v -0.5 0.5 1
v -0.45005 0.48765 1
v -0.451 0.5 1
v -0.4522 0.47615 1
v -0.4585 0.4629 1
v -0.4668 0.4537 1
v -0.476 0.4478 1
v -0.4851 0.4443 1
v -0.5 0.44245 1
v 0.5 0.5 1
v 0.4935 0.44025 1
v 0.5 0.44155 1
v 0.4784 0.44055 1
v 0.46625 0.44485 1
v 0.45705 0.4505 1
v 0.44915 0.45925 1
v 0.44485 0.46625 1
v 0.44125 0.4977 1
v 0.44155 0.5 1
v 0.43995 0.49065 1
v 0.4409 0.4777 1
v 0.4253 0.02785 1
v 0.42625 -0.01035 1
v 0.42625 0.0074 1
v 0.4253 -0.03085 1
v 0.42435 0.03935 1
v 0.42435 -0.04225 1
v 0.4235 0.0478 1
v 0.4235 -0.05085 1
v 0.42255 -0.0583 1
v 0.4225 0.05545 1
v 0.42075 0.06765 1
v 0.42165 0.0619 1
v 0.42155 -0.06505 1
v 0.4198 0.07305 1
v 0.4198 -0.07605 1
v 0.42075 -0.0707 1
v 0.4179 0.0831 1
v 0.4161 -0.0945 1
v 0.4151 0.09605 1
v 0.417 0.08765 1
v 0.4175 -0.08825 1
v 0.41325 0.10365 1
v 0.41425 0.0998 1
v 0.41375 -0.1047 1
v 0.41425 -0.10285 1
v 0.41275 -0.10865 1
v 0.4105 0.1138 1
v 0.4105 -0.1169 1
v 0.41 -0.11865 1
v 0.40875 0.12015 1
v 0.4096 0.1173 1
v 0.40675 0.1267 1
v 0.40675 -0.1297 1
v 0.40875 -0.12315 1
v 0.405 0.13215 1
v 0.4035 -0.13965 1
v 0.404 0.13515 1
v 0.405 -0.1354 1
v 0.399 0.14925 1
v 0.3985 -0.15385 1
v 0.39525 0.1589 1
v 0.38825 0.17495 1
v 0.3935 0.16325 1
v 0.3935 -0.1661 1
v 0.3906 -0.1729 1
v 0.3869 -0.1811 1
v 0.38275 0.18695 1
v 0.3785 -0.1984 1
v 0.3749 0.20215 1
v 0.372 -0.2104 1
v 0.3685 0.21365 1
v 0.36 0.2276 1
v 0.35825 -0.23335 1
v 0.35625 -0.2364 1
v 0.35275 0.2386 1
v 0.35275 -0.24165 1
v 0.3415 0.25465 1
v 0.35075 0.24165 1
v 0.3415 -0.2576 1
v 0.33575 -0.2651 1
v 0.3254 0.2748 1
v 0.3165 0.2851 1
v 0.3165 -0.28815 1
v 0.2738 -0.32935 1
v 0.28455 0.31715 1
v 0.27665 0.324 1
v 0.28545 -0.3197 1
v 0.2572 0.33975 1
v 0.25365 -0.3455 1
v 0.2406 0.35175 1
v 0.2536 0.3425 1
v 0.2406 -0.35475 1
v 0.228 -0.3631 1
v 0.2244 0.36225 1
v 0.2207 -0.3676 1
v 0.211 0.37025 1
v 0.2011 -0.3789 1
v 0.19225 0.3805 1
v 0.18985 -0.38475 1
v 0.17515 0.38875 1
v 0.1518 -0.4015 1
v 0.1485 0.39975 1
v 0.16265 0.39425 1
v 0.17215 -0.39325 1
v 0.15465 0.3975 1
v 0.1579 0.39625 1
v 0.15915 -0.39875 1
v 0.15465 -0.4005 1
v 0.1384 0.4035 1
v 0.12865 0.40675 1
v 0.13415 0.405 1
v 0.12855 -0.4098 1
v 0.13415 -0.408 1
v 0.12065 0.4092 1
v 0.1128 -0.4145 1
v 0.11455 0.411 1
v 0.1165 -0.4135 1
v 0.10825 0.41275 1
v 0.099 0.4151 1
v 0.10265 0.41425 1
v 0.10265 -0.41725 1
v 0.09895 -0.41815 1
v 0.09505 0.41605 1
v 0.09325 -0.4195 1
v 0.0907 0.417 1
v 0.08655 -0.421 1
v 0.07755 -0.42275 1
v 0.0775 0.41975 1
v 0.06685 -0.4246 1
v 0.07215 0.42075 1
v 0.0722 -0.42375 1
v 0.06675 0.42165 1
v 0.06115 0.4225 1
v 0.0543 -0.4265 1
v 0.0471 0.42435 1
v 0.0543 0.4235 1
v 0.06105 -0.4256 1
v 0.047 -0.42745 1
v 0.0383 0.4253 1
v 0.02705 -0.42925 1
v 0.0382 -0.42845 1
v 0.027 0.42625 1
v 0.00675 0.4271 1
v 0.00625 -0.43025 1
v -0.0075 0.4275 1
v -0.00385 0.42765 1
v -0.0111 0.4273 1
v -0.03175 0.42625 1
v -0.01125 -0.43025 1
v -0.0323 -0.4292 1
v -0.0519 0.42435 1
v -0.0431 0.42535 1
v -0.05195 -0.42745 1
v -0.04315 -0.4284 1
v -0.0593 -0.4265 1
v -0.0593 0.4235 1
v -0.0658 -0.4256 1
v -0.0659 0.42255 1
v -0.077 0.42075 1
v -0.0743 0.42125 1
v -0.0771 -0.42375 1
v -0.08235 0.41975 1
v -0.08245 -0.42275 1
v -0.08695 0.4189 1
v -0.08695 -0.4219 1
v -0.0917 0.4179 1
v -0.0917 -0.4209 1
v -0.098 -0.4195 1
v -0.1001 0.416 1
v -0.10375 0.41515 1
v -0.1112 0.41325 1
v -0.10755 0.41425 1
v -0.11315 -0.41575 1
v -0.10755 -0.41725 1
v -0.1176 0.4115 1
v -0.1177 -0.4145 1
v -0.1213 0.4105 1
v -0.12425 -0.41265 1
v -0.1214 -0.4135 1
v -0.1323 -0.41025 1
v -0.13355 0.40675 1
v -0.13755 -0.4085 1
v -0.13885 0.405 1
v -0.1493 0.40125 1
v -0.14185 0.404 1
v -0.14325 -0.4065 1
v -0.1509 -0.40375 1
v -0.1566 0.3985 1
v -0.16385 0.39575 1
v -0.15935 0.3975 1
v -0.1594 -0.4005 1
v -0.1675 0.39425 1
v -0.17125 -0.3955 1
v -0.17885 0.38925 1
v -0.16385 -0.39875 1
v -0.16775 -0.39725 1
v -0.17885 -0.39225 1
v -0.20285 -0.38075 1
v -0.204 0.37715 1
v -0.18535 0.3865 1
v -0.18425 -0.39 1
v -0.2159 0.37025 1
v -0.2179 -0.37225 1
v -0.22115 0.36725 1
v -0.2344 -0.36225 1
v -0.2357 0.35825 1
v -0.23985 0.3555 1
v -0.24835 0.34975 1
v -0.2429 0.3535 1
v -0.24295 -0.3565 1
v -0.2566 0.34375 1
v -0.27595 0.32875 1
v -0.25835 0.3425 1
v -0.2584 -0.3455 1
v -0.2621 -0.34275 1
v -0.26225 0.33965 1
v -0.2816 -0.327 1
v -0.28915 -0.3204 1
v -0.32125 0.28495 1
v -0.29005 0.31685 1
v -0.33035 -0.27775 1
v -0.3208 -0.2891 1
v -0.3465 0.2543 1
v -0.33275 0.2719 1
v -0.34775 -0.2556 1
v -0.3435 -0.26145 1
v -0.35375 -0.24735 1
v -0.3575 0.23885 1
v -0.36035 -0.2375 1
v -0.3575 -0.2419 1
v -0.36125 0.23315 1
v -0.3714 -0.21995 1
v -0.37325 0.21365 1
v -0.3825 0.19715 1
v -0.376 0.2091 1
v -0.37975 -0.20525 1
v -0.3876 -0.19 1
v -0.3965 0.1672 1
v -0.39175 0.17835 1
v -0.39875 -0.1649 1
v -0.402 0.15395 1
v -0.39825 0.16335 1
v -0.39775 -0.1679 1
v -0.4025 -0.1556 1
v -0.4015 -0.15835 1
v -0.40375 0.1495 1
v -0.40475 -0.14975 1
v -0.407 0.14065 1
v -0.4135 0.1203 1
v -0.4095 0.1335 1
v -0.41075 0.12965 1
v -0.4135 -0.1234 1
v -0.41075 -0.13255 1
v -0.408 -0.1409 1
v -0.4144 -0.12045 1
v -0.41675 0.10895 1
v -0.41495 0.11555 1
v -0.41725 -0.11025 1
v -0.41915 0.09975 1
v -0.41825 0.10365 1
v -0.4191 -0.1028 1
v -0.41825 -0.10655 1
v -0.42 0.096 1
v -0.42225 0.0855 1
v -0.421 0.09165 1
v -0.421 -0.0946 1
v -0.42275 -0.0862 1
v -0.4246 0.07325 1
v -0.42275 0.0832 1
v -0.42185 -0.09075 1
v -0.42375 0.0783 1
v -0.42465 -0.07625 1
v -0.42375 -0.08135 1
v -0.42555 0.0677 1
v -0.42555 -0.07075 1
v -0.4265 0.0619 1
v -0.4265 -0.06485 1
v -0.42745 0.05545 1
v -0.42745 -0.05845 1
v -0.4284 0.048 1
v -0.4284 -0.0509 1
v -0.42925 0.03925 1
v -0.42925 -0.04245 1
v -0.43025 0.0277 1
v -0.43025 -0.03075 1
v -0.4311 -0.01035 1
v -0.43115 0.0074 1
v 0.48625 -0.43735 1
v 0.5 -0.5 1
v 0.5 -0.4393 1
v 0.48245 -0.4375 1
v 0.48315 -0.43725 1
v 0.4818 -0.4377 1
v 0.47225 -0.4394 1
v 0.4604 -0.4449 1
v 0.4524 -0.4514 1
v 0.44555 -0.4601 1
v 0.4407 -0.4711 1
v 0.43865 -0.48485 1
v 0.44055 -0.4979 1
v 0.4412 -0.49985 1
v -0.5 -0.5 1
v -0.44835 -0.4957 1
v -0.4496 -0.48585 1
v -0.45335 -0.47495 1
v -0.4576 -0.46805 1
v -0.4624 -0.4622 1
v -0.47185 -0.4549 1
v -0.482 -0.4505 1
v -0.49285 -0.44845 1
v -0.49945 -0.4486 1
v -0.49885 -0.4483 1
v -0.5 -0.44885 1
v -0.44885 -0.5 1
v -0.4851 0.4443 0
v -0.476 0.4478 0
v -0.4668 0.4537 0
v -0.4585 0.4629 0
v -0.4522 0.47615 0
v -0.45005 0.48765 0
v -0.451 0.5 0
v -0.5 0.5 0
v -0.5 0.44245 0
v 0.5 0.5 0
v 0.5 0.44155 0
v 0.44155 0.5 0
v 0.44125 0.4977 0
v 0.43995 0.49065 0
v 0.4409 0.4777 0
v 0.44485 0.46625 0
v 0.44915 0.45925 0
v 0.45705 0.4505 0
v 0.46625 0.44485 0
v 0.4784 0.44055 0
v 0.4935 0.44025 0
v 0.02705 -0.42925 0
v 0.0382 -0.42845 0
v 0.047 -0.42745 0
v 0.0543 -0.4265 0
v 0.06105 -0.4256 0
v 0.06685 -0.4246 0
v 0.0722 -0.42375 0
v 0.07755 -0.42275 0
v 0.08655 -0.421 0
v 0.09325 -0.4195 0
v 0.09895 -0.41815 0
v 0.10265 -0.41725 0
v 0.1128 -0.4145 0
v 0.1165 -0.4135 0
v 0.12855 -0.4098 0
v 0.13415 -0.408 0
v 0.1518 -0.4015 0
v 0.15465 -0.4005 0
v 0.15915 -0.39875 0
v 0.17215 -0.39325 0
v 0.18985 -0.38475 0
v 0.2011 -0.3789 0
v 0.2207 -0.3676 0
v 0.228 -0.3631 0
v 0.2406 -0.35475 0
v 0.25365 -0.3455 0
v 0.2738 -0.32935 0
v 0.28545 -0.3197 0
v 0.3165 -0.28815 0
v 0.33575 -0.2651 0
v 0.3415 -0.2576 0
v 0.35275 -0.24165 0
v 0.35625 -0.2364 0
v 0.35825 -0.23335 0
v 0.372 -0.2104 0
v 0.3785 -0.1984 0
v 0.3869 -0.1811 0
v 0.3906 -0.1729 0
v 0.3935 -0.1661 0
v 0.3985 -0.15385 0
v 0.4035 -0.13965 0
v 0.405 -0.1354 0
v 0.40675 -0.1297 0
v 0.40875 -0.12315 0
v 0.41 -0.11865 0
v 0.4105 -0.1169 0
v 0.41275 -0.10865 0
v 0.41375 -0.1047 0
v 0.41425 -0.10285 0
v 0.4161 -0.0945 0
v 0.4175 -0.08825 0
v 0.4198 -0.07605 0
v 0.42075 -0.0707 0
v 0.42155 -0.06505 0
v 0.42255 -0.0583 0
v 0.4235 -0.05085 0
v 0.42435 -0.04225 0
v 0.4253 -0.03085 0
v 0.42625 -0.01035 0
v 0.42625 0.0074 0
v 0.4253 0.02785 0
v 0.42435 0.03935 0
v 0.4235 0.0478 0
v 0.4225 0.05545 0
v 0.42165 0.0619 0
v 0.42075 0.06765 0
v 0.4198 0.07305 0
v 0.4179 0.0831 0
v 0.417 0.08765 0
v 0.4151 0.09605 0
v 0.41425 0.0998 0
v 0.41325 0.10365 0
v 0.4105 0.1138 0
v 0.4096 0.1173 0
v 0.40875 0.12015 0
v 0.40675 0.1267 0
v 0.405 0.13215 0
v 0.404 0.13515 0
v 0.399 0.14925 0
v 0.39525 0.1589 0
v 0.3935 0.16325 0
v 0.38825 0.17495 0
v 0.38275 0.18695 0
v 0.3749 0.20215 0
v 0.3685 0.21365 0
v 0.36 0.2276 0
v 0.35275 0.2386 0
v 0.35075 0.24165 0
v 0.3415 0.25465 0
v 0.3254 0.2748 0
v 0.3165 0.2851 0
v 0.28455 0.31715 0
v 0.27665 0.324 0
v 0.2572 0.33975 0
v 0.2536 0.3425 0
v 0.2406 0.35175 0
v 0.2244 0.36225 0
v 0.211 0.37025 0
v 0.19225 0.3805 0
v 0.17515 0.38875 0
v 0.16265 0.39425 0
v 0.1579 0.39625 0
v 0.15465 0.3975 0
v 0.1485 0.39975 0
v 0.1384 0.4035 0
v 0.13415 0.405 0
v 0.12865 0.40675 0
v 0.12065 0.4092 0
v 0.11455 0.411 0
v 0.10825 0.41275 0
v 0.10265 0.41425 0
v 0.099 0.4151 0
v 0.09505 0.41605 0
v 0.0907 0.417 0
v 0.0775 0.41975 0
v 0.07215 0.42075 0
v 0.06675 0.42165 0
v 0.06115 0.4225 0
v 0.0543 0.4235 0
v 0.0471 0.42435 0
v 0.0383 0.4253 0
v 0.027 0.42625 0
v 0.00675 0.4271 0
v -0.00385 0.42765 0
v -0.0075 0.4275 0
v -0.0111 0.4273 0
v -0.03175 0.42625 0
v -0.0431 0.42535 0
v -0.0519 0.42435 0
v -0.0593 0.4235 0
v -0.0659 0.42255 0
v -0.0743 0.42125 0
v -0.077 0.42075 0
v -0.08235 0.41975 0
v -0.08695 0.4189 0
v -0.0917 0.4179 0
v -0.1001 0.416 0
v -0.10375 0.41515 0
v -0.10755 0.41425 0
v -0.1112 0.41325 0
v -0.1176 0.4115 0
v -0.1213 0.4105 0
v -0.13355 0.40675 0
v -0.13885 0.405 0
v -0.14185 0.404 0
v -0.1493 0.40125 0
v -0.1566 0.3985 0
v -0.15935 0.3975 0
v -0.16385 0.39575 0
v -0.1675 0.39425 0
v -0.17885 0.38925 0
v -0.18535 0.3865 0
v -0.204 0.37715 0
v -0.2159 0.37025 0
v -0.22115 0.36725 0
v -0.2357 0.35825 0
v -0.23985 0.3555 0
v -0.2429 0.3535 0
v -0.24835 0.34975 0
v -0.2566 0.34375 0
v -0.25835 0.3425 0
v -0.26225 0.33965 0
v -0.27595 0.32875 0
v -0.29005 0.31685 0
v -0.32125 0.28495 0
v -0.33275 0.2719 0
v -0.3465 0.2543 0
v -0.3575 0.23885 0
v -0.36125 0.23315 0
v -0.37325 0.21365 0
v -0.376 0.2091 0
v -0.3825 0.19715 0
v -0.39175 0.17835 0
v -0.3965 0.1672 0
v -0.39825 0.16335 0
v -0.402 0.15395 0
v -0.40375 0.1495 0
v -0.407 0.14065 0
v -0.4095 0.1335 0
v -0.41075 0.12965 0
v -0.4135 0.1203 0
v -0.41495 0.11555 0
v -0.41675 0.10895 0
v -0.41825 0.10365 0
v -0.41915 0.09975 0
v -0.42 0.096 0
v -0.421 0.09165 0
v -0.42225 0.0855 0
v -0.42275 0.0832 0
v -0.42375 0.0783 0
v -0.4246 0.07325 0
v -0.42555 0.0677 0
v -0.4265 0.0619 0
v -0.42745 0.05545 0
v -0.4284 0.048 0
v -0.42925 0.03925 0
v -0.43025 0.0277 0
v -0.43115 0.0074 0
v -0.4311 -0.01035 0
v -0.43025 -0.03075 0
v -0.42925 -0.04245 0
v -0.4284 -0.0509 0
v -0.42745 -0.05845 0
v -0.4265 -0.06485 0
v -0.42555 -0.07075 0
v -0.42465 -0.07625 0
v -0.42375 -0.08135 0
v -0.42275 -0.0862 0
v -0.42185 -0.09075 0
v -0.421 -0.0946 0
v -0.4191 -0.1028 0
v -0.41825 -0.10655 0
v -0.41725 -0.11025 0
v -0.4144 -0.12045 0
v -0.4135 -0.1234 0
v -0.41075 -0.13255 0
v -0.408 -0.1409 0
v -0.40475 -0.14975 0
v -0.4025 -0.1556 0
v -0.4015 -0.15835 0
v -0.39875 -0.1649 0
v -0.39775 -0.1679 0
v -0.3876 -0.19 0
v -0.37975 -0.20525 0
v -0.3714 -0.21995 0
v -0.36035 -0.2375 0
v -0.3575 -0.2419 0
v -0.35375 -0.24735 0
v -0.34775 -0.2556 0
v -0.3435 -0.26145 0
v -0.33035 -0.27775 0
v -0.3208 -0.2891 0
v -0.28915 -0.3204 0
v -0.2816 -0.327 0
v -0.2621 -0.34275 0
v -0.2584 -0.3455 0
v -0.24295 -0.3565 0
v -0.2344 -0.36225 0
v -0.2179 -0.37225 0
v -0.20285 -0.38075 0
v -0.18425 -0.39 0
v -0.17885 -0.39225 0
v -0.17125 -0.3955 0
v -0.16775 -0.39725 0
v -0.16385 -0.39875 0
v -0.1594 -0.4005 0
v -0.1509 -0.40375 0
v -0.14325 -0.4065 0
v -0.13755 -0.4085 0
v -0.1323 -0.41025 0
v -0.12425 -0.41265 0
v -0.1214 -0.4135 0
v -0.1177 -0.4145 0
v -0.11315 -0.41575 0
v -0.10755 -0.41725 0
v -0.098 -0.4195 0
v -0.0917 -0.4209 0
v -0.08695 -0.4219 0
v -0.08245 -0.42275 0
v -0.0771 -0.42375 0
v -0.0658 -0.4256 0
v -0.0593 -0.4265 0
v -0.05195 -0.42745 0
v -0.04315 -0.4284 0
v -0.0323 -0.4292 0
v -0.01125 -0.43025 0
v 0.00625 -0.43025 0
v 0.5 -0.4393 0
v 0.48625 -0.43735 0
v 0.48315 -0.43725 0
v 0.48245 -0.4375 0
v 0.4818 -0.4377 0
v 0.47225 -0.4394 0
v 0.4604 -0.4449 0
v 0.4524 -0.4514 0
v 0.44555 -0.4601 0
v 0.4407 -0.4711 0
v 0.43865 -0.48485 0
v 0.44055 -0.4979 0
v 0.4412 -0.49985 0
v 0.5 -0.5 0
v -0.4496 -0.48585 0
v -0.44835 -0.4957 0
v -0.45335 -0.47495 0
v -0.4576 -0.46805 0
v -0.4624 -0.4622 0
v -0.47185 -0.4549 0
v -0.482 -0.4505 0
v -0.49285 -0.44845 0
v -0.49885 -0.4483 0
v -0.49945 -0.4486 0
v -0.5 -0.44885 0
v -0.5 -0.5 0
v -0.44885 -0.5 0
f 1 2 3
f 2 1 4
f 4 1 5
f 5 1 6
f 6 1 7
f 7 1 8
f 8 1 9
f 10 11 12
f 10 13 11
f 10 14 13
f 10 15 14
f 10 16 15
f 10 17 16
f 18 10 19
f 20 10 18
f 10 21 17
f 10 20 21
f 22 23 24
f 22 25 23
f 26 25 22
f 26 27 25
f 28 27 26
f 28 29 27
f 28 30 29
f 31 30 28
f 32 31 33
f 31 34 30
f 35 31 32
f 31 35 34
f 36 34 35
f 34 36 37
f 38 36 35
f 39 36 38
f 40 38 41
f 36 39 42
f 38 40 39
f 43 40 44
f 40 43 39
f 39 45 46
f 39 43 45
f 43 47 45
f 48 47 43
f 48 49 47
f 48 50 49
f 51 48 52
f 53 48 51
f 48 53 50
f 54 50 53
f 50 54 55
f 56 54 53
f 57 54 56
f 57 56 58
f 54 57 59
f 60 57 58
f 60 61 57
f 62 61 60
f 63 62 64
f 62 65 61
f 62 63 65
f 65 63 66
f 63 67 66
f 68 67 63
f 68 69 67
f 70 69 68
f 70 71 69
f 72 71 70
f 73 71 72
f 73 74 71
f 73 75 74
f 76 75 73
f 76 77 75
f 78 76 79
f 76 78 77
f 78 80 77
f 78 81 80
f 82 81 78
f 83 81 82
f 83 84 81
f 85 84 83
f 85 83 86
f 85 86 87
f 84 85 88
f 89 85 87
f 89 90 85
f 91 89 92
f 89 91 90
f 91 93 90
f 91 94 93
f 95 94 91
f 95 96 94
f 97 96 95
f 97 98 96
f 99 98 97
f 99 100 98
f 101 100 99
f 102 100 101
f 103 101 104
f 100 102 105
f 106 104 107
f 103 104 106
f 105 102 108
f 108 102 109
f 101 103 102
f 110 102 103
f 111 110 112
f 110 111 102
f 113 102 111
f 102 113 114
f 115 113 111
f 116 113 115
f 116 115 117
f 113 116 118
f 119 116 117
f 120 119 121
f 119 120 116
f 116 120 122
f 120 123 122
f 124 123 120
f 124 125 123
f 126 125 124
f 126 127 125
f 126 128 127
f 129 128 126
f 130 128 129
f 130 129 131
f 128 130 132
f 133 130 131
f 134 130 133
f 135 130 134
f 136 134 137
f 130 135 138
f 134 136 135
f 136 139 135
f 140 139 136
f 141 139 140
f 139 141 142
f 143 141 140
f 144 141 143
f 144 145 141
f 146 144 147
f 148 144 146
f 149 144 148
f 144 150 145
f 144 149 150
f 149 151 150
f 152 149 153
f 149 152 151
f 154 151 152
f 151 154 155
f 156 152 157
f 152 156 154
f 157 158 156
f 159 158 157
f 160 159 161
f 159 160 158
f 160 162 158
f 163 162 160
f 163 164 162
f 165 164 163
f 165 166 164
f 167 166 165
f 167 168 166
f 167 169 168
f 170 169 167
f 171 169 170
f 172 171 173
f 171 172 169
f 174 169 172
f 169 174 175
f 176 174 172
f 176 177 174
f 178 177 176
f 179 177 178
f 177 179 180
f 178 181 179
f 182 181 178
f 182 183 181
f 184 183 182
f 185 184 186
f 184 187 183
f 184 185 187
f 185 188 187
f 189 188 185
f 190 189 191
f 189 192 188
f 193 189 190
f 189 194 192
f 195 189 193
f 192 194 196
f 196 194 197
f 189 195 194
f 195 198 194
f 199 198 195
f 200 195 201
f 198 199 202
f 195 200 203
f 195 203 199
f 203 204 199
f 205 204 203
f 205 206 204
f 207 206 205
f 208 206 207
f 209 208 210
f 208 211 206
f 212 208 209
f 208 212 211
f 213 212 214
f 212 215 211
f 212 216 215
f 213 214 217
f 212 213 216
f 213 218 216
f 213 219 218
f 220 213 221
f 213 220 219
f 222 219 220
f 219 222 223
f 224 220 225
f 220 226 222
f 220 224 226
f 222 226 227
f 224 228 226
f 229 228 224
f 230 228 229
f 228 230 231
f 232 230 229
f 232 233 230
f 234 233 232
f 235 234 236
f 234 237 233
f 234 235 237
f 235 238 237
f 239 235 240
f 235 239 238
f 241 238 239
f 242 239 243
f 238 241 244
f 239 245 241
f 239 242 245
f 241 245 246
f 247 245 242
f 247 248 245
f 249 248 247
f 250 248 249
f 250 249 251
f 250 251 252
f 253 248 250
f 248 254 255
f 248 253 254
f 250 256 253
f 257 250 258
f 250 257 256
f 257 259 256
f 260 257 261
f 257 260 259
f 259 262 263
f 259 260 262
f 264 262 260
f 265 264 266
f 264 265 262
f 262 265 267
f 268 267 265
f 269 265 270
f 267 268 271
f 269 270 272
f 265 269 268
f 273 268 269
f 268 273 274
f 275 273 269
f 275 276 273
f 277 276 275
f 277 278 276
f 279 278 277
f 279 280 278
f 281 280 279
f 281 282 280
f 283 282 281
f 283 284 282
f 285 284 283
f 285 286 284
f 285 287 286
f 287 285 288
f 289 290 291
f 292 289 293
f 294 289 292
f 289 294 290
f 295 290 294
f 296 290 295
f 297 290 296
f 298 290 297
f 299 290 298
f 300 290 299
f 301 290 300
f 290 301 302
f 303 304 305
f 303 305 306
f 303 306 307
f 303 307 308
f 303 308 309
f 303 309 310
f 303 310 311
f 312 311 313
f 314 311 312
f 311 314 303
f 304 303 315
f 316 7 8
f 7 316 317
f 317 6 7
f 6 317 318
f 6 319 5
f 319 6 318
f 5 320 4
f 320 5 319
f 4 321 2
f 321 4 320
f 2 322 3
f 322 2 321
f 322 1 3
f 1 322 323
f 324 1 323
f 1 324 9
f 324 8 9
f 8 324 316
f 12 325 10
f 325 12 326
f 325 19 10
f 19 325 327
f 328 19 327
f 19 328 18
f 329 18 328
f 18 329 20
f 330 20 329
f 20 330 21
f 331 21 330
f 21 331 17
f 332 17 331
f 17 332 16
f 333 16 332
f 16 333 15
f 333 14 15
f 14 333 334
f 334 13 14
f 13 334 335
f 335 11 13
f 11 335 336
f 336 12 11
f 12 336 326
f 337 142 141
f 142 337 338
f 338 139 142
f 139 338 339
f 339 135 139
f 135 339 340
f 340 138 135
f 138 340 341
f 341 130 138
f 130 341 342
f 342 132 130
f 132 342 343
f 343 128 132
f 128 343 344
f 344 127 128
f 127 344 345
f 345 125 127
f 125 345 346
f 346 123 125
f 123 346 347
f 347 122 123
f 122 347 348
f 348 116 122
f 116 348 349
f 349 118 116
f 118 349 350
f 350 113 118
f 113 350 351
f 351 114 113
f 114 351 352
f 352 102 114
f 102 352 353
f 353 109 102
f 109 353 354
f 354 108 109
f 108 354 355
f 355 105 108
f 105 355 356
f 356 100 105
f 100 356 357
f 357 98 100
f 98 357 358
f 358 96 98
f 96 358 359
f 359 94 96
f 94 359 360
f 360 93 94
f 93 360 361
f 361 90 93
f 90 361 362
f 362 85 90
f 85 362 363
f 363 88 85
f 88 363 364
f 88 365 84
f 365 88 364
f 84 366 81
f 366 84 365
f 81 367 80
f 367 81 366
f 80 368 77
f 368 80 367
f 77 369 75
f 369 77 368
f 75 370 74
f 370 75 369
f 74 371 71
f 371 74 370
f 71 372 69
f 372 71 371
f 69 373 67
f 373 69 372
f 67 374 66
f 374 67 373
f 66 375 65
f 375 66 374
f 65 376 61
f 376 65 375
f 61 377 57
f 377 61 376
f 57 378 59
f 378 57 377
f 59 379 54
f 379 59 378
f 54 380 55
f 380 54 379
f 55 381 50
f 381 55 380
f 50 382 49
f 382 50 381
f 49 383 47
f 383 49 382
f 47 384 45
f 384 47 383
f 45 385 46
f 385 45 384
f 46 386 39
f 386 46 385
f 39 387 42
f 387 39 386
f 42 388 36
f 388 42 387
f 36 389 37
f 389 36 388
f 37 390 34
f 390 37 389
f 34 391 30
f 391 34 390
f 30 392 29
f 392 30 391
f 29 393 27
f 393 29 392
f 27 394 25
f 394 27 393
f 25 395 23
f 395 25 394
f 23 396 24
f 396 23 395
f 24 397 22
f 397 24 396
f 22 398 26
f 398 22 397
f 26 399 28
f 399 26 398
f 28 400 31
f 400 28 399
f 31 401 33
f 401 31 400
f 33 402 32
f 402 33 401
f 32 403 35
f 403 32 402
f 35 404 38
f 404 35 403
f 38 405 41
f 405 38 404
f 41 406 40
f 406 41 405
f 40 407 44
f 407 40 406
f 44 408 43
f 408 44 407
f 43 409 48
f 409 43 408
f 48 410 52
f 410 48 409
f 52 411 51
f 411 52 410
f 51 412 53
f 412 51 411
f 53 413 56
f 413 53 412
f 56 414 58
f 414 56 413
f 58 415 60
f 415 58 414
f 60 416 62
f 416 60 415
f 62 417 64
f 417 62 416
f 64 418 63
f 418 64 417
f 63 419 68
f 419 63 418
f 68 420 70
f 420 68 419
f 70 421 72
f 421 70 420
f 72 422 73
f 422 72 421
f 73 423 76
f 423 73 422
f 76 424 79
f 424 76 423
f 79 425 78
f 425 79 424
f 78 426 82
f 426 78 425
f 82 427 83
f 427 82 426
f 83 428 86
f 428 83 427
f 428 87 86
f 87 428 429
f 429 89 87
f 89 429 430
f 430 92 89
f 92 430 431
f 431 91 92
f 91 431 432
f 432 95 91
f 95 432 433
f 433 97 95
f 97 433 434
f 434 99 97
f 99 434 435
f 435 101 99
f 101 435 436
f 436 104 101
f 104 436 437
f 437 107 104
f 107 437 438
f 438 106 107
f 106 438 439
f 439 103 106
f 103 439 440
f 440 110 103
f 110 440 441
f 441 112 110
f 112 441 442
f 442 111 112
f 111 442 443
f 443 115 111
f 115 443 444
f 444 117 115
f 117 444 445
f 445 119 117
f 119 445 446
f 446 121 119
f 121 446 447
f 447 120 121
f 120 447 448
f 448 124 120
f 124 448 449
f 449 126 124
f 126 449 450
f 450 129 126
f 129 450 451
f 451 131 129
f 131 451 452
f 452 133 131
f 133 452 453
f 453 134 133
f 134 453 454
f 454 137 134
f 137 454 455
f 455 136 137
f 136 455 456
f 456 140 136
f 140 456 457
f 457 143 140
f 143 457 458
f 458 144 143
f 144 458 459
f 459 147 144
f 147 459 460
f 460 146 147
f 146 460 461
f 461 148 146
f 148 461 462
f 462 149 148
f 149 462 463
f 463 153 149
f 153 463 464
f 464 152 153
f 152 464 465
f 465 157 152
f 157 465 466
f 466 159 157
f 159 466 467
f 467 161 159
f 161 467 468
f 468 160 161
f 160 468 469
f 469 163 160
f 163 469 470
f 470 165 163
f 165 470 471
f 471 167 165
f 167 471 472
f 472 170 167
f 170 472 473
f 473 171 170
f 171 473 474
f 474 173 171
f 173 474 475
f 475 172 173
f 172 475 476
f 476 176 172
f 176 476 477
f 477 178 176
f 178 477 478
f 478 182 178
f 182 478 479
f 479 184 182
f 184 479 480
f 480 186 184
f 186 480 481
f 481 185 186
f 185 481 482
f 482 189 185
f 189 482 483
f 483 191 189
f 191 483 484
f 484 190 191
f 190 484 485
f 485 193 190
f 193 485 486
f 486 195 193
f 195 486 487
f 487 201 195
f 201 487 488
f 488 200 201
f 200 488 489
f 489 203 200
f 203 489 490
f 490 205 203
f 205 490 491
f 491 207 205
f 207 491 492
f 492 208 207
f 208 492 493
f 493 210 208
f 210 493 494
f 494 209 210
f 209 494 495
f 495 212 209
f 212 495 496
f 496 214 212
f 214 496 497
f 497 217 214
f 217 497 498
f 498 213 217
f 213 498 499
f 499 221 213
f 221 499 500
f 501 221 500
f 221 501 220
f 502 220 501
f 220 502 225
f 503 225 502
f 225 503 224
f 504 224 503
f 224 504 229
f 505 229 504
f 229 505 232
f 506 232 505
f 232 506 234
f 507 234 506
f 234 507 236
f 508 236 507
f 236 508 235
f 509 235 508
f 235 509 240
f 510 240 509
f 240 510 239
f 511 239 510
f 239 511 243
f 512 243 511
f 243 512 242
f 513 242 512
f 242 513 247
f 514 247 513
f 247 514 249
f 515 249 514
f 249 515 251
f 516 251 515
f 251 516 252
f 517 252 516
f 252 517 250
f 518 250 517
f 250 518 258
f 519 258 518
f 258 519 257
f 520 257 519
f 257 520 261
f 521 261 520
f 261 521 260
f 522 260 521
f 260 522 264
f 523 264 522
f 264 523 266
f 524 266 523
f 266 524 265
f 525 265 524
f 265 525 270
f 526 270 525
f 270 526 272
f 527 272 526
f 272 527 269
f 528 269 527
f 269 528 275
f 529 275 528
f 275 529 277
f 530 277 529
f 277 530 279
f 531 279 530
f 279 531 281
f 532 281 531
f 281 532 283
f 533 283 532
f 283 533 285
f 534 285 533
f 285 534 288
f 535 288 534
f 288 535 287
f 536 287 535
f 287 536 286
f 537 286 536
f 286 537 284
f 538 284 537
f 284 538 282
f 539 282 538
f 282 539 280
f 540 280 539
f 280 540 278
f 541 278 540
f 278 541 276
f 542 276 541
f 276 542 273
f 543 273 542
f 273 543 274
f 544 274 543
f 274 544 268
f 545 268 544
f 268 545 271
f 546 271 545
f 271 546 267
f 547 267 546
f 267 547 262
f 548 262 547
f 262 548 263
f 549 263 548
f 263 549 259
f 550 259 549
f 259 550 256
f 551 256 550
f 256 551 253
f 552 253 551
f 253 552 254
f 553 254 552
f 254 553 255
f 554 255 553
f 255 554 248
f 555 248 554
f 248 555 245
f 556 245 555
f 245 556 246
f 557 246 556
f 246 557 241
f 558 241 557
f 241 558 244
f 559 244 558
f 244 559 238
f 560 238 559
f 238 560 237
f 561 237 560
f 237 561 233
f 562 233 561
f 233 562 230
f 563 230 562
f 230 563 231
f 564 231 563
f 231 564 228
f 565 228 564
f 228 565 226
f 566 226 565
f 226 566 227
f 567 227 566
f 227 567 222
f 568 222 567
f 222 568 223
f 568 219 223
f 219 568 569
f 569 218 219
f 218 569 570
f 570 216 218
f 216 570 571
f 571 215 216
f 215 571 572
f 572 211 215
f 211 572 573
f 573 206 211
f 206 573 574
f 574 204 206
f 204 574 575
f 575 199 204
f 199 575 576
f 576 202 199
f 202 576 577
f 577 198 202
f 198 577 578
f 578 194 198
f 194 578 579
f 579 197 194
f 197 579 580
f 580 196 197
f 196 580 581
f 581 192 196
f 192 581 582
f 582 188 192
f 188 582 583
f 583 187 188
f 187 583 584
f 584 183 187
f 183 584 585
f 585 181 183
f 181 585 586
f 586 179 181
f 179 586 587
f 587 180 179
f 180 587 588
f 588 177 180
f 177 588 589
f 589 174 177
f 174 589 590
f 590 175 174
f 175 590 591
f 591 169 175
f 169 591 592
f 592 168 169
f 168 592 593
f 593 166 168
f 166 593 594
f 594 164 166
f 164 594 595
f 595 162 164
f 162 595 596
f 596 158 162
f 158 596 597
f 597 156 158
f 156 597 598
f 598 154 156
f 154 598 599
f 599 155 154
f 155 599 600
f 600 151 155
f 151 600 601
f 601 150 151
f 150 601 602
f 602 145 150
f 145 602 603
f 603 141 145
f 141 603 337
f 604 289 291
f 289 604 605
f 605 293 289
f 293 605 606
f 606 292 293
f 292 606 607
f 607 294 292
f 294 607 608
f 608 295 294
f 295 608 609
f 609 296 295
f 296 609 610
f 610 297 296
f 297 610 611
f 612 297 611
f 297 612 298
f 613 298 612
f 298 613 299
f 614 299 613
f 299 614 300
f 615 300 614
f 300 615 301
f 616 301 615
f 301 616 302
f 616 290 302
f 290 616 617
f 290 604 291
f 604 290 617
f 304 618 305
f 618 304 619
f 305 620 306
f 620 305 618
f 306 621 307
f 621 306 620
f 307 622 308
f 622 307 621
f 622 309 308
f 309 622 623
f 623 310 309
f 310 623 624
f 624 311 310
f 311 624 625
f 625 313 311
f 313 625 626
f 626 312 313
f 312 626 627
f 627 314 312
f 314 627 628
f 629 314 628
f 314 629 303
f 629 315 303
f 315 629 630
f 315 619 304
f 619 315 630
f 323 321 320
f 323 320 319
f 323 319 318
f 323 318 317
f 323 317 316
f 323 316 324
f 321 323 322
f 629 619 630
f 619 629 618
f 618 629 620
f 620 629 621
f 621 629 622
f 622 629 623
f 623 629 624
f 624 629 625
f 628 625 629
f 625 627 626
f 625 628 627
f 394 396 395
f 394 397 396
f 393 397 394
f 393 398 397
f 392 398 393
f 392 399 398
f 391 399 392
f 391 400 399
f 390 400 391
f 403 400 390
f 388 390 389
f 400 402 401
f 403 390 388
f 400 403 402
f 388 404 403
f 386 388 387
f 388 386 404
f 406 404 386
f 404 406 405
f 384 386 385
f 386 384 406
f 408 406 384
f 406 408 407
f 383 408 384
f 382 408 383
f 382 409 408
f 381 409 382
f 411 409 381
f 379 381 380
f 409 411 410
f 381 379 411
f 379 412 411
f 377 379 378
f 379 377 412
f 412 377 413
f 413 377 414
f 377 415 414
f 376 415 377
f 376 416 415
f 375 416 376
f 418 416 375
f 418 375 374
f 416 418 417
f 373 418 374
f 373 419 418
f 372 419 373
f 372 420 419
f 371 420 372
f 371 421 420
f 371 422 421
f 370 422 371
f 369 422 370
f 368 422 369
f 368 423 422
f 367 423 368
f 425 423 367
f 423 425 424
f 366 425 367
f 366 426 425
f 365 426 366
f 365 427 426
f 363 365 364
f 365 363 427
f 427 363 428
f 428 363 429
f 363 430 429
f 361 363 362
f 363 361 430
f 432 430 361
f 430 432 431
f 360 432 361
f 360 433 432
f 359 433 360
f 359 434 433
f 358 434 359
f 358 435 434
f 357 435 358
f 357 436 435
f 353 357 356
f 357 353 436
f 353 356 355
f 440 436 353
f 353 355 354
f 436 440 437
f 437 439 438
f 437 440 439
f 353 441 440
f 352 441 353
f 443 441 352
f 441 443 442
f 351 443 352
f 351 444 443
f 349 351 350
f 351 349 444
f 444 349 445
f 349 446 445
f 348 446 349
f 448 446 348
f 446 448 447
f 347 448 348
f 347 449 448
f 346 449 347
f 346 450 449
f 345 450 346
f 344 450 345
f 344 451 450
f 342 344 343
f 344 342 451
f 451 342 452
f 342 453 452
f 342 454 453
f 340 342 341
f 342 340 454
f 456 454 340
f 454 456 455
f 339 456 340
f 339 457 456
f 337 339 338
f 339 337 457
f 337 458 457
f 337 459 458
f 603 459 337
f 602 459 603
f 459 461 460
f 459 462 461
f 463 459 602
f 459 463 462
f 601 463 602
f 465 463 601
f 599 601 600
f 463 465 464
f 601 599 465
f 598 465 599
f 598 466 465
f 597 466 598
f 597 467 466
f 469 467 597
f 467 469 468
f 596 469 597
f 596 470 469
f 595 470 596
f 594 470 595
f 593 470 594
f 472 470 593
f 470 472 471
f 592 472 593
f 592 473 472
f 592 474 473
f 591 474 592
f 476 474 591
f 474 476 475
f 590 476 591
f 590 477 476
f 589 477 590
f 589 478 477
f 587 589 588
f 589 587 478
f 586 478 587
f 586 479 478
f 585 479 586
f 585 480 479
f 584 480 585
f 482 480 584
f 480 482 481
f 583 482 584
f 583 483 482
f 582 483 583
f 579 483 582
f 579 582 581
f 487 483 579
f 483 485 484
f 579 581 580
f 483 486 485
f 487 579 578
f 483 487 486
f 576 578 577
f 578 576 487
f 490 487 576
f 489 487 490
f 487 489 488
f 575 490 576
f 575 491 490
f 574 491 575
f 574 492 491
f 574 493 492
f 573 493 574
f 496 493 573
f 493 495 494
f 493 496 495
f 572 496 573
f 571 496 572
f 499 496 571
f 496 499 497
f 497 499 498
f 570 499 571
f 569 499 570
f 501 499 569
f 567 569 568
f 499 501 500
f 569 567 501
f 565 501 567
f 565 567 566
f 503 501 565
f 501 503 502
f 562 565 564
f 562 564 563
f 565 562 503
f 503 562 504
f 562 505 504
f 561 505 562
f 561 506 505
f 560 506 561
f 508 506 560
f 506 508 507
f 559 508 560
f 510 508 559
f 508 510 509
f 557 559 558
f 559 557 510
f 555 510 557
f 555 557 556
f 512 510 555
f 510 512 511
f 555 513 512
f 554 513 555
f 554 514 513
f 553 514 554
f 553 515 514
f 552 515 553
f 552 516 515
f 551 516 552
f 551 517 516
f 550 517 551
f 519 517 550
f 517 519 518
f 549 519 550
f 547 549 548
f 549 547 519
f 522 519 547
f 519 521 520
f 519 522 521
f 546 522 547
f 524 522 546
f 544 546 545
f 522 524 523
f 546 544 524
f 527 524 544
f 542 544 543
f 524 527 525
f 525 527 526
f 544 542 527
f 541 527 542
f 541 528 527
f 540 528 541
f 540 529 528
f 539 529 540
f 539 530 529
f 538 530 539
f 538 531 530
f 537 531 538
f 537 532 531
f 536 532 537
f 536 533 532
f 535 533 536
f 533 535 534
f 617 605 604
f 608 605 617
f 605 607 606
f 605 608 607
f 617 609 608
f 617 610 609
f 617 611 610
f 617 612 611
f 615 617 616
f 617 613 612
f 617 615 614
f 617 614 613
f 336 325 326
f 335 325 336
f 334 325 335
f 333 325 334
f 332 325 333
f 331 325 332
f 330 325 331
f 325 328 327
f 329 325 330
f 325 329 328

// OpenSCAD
module Stealie4disk_1()
{
 /* Generated by trace2scad version 20150415
    http://aggregate.org/MAKE/TRACE2SCAD/
    Optimized model has 319/2869 original points
 */
 color([0.5, 0.5, 0.5])
 assign(minx=0) /* polygon minx=0 */
 assign(miny=0) /* polygon miny=0 */
 assign(maxx=20000) /* polygon maxx=20000 */
 assign(maxy=20000) /* polygon maxy=20000 */
 assign(dx=maxx-minx)
 assign(dy=maxy-miny)
 assign(maxd=((dx>dy)?dx:dy))
 scale([1/maxd, 1/maxd, 1])
 translate([-minx-dx/2, -miny-dy/2, 0])
 linear_extrude(height=1, convexity=319)
 union() {
  union() {
   polygon([[0,19425],[0,18849],[298,18886],[480,18956],[664,19074],[830,19258],[956,19523],[999,19753],[980,20000],[0,20000]], convexity=5);
   polygon([[18828,19977],[18825,19954],[18799,19813],[18818,19554],[18897,19325],[18983,19185],[19141,19010],[19325,18897],[19568,18811],[19870,18805],[20000,18831],[20000,20000],[18831,20000]], convexity=6);
   polygon([[9850,18550],[9778,18546],[9365,18525],[9138,18507],[8962,18487],[8814,18470],[8682,18451],[8514,18425],[8460,18415],[8353,18395],[8261,18378],[8166,18358],[7998,18320],[7925,18303],[7849,18285],[7776,18265],[7648,18230],[7574,18210],[7329,18135],[7223,18100],[7163,18080],[7014,18025],[6868,17970],[6813,17950],[6723,17915],[6650,17885],[6423,17785],[6293,17730],[5920,17543],[5682,17405],[5577,17345],[5286,17165],[5203,17110],[5142,17070],[5033,16995],[4868,16875],[4833,16850],[4755,16793],[4481,16575],[4199,16337],[3575,15699],[3345,15438],[3070,15086],[2850,14777],[2775,14663],[2535,14273],[2480,14182],[2350,13943],[2165,13567],[2070,13344],[2035,13267],[1960,13079],[1925,12990],[1860,12813],[1810,12670],[1785,12593],[1730,12406],[1701,12311],[1665,12179],[1635,12073],[1617,11995],[1600,11920],[1580,11833],[1555,11710],[1545,11664],[1525,11566],[1508,11465],[1489,11354],[1470,11238],[1451,11109],[1432,10960],[1415,10785],[1395,10554],[1377,10148],[1378,9793],[1395,9385],[1415,9151],[1432,8982],[1451,8831],[1470,8703],[1489,8585],[1507,8475],[1525,8373],[1545,8276],[1563,8185],[1580,8108],[1618,7944],[1635,7869],[1655,7795],[1712,7591],[1730,7532],[1785,7349],[1840,7182],[1905,7005],[1950,6888],[1970,6833],[2025,6702],[2045,6642],[2248,6200],[2405,5895],[2572,5601],[2793,5250],[2850,5162],[2925,5053],[3045,4888],[3130,4771],[3393,4445],[3584,4218],[4217,3592],[4368,3460],[4758,3145],[4832,3090],[5141,2870],[5312,2755],[5642,2555],[5943,2385],[6315,2200],[6423,2155],[6575,2090],[6645,2055],[6723,2025],[6812,1990],[6982,1925],[7135,1870],[7249,1830],[7354,1795],[7515,1747],[7572,1730],[7646,1710],[7737,1685],[7849,1655],[8040,1610],[8166,1582],[8261,1562],[8351,1545],[8458,1525],[8684,1488],[8814,1470],[8961,1451],[9137,1432],[9354,1416],[9775,1395],[10125,1395],[10541,1415],[10764,1431],[10940,1451],[11086,1470],[11221,1488],[11337,1508],[11444,1525],[11551,1545],[11731,1580],[11865,1610],[11979,1637],[12053,1655],[12256,1710],[12330,1730],[12571,1804],[12683,1840],[13036,1970],[13093,1990],[13183,2025],[13313,2080],[13443,2135],[13797,2305],[14022,2422],[14414,2648],[14560,2738],[14812,2905],[15073,3090],[15476,3413],[15709,3606],[16330,4237],[16715,4698],[16830,4848],[17055,5167],[17125,5272],[17165,5333],[17440,5792],[17570,6032],[17738,6378],[17812,6542],[17870,6678],[17970,6923],[18070,7207],[18100,7292],[18135,7406],[18175,7537],[18200,7627],[18210,7662],[18255,7827],[18275,7906],[18285,7943],[18322,8110],[18350,8235],[18396,8479],[18415,8586],[18431,8699],[18451,8834],[18470,8983],[18487,9155],[18506,9383],[18525,9793],[18525,10148],[18506,10557],[18487,10787],[18470,10956],[18450,11109],[18433,11238],[18415,11353],[18396,11461],[18358,11662],[18340,11753],[18302,11921],[18285,11996],[18265,12073],[18210,12276],[18192,12346],[18175,12403],[18135,12534],[18100,12643],[18080,12703],[17980,12985],[17905,13178],[17870,13265],[17765,13499],[17655,13739],[17498,14043],[17370,14273],[17200,14552],[17055,14772],[17015,14833],[16830,15093],[16508,15496],[16330,15702],[15691,16343],[15533,16480],[15144,16795],[15072,16850],[14812,17035],[14488,17245],[14220,17405],[13845,17610],[13503,17775],[13253,17885],[13158,17925],[13093,17950],[12970,17995],[12768,18070],[12683,18100],[12573,18135],[12413,18184],[12291,18220],[12165,18255],[12053,18285],[11980,18302],[11901,18321],[11814,18340],[11598,18385],[11550,18395],[11443,18415],[11335,18433],[11223,18450],[11086,18470],[10942,18487],[10766,18506],[10540,18525],[10135,18542],[9923,18553]], convexity=6);
   polygon([[19649,1250],[19636,1246],[19445,1212],[19208,1102],[19048,972],[18911,798],[18814,578],[18773,303],[18811,42],[18824,3],[20000,0],[20000,1214],[19725,1253],[19663,1255]], convexity=6);
   polygon([[11,1028],[0,1023],[0,0],[1023,0],[1033,86],[1008,283],[933,501],[848,639],[752,756],[563,902],[360,990],[143,1031],[23,1034]], convexity=6);
  }
 }
}

module Stealie4disk()
{
 /* all layers combined, scaled to within a 1mm cube */
 scale([1, 1, 1/1])
 difference() {
  union() {
   scale([1,1,2]) translate([0,0,-0.5]) Stealie4disk_1();
  }
  translate([0,0,-2]) cube([2,2,4],center=true);
 }
}
Stealie4disk();
